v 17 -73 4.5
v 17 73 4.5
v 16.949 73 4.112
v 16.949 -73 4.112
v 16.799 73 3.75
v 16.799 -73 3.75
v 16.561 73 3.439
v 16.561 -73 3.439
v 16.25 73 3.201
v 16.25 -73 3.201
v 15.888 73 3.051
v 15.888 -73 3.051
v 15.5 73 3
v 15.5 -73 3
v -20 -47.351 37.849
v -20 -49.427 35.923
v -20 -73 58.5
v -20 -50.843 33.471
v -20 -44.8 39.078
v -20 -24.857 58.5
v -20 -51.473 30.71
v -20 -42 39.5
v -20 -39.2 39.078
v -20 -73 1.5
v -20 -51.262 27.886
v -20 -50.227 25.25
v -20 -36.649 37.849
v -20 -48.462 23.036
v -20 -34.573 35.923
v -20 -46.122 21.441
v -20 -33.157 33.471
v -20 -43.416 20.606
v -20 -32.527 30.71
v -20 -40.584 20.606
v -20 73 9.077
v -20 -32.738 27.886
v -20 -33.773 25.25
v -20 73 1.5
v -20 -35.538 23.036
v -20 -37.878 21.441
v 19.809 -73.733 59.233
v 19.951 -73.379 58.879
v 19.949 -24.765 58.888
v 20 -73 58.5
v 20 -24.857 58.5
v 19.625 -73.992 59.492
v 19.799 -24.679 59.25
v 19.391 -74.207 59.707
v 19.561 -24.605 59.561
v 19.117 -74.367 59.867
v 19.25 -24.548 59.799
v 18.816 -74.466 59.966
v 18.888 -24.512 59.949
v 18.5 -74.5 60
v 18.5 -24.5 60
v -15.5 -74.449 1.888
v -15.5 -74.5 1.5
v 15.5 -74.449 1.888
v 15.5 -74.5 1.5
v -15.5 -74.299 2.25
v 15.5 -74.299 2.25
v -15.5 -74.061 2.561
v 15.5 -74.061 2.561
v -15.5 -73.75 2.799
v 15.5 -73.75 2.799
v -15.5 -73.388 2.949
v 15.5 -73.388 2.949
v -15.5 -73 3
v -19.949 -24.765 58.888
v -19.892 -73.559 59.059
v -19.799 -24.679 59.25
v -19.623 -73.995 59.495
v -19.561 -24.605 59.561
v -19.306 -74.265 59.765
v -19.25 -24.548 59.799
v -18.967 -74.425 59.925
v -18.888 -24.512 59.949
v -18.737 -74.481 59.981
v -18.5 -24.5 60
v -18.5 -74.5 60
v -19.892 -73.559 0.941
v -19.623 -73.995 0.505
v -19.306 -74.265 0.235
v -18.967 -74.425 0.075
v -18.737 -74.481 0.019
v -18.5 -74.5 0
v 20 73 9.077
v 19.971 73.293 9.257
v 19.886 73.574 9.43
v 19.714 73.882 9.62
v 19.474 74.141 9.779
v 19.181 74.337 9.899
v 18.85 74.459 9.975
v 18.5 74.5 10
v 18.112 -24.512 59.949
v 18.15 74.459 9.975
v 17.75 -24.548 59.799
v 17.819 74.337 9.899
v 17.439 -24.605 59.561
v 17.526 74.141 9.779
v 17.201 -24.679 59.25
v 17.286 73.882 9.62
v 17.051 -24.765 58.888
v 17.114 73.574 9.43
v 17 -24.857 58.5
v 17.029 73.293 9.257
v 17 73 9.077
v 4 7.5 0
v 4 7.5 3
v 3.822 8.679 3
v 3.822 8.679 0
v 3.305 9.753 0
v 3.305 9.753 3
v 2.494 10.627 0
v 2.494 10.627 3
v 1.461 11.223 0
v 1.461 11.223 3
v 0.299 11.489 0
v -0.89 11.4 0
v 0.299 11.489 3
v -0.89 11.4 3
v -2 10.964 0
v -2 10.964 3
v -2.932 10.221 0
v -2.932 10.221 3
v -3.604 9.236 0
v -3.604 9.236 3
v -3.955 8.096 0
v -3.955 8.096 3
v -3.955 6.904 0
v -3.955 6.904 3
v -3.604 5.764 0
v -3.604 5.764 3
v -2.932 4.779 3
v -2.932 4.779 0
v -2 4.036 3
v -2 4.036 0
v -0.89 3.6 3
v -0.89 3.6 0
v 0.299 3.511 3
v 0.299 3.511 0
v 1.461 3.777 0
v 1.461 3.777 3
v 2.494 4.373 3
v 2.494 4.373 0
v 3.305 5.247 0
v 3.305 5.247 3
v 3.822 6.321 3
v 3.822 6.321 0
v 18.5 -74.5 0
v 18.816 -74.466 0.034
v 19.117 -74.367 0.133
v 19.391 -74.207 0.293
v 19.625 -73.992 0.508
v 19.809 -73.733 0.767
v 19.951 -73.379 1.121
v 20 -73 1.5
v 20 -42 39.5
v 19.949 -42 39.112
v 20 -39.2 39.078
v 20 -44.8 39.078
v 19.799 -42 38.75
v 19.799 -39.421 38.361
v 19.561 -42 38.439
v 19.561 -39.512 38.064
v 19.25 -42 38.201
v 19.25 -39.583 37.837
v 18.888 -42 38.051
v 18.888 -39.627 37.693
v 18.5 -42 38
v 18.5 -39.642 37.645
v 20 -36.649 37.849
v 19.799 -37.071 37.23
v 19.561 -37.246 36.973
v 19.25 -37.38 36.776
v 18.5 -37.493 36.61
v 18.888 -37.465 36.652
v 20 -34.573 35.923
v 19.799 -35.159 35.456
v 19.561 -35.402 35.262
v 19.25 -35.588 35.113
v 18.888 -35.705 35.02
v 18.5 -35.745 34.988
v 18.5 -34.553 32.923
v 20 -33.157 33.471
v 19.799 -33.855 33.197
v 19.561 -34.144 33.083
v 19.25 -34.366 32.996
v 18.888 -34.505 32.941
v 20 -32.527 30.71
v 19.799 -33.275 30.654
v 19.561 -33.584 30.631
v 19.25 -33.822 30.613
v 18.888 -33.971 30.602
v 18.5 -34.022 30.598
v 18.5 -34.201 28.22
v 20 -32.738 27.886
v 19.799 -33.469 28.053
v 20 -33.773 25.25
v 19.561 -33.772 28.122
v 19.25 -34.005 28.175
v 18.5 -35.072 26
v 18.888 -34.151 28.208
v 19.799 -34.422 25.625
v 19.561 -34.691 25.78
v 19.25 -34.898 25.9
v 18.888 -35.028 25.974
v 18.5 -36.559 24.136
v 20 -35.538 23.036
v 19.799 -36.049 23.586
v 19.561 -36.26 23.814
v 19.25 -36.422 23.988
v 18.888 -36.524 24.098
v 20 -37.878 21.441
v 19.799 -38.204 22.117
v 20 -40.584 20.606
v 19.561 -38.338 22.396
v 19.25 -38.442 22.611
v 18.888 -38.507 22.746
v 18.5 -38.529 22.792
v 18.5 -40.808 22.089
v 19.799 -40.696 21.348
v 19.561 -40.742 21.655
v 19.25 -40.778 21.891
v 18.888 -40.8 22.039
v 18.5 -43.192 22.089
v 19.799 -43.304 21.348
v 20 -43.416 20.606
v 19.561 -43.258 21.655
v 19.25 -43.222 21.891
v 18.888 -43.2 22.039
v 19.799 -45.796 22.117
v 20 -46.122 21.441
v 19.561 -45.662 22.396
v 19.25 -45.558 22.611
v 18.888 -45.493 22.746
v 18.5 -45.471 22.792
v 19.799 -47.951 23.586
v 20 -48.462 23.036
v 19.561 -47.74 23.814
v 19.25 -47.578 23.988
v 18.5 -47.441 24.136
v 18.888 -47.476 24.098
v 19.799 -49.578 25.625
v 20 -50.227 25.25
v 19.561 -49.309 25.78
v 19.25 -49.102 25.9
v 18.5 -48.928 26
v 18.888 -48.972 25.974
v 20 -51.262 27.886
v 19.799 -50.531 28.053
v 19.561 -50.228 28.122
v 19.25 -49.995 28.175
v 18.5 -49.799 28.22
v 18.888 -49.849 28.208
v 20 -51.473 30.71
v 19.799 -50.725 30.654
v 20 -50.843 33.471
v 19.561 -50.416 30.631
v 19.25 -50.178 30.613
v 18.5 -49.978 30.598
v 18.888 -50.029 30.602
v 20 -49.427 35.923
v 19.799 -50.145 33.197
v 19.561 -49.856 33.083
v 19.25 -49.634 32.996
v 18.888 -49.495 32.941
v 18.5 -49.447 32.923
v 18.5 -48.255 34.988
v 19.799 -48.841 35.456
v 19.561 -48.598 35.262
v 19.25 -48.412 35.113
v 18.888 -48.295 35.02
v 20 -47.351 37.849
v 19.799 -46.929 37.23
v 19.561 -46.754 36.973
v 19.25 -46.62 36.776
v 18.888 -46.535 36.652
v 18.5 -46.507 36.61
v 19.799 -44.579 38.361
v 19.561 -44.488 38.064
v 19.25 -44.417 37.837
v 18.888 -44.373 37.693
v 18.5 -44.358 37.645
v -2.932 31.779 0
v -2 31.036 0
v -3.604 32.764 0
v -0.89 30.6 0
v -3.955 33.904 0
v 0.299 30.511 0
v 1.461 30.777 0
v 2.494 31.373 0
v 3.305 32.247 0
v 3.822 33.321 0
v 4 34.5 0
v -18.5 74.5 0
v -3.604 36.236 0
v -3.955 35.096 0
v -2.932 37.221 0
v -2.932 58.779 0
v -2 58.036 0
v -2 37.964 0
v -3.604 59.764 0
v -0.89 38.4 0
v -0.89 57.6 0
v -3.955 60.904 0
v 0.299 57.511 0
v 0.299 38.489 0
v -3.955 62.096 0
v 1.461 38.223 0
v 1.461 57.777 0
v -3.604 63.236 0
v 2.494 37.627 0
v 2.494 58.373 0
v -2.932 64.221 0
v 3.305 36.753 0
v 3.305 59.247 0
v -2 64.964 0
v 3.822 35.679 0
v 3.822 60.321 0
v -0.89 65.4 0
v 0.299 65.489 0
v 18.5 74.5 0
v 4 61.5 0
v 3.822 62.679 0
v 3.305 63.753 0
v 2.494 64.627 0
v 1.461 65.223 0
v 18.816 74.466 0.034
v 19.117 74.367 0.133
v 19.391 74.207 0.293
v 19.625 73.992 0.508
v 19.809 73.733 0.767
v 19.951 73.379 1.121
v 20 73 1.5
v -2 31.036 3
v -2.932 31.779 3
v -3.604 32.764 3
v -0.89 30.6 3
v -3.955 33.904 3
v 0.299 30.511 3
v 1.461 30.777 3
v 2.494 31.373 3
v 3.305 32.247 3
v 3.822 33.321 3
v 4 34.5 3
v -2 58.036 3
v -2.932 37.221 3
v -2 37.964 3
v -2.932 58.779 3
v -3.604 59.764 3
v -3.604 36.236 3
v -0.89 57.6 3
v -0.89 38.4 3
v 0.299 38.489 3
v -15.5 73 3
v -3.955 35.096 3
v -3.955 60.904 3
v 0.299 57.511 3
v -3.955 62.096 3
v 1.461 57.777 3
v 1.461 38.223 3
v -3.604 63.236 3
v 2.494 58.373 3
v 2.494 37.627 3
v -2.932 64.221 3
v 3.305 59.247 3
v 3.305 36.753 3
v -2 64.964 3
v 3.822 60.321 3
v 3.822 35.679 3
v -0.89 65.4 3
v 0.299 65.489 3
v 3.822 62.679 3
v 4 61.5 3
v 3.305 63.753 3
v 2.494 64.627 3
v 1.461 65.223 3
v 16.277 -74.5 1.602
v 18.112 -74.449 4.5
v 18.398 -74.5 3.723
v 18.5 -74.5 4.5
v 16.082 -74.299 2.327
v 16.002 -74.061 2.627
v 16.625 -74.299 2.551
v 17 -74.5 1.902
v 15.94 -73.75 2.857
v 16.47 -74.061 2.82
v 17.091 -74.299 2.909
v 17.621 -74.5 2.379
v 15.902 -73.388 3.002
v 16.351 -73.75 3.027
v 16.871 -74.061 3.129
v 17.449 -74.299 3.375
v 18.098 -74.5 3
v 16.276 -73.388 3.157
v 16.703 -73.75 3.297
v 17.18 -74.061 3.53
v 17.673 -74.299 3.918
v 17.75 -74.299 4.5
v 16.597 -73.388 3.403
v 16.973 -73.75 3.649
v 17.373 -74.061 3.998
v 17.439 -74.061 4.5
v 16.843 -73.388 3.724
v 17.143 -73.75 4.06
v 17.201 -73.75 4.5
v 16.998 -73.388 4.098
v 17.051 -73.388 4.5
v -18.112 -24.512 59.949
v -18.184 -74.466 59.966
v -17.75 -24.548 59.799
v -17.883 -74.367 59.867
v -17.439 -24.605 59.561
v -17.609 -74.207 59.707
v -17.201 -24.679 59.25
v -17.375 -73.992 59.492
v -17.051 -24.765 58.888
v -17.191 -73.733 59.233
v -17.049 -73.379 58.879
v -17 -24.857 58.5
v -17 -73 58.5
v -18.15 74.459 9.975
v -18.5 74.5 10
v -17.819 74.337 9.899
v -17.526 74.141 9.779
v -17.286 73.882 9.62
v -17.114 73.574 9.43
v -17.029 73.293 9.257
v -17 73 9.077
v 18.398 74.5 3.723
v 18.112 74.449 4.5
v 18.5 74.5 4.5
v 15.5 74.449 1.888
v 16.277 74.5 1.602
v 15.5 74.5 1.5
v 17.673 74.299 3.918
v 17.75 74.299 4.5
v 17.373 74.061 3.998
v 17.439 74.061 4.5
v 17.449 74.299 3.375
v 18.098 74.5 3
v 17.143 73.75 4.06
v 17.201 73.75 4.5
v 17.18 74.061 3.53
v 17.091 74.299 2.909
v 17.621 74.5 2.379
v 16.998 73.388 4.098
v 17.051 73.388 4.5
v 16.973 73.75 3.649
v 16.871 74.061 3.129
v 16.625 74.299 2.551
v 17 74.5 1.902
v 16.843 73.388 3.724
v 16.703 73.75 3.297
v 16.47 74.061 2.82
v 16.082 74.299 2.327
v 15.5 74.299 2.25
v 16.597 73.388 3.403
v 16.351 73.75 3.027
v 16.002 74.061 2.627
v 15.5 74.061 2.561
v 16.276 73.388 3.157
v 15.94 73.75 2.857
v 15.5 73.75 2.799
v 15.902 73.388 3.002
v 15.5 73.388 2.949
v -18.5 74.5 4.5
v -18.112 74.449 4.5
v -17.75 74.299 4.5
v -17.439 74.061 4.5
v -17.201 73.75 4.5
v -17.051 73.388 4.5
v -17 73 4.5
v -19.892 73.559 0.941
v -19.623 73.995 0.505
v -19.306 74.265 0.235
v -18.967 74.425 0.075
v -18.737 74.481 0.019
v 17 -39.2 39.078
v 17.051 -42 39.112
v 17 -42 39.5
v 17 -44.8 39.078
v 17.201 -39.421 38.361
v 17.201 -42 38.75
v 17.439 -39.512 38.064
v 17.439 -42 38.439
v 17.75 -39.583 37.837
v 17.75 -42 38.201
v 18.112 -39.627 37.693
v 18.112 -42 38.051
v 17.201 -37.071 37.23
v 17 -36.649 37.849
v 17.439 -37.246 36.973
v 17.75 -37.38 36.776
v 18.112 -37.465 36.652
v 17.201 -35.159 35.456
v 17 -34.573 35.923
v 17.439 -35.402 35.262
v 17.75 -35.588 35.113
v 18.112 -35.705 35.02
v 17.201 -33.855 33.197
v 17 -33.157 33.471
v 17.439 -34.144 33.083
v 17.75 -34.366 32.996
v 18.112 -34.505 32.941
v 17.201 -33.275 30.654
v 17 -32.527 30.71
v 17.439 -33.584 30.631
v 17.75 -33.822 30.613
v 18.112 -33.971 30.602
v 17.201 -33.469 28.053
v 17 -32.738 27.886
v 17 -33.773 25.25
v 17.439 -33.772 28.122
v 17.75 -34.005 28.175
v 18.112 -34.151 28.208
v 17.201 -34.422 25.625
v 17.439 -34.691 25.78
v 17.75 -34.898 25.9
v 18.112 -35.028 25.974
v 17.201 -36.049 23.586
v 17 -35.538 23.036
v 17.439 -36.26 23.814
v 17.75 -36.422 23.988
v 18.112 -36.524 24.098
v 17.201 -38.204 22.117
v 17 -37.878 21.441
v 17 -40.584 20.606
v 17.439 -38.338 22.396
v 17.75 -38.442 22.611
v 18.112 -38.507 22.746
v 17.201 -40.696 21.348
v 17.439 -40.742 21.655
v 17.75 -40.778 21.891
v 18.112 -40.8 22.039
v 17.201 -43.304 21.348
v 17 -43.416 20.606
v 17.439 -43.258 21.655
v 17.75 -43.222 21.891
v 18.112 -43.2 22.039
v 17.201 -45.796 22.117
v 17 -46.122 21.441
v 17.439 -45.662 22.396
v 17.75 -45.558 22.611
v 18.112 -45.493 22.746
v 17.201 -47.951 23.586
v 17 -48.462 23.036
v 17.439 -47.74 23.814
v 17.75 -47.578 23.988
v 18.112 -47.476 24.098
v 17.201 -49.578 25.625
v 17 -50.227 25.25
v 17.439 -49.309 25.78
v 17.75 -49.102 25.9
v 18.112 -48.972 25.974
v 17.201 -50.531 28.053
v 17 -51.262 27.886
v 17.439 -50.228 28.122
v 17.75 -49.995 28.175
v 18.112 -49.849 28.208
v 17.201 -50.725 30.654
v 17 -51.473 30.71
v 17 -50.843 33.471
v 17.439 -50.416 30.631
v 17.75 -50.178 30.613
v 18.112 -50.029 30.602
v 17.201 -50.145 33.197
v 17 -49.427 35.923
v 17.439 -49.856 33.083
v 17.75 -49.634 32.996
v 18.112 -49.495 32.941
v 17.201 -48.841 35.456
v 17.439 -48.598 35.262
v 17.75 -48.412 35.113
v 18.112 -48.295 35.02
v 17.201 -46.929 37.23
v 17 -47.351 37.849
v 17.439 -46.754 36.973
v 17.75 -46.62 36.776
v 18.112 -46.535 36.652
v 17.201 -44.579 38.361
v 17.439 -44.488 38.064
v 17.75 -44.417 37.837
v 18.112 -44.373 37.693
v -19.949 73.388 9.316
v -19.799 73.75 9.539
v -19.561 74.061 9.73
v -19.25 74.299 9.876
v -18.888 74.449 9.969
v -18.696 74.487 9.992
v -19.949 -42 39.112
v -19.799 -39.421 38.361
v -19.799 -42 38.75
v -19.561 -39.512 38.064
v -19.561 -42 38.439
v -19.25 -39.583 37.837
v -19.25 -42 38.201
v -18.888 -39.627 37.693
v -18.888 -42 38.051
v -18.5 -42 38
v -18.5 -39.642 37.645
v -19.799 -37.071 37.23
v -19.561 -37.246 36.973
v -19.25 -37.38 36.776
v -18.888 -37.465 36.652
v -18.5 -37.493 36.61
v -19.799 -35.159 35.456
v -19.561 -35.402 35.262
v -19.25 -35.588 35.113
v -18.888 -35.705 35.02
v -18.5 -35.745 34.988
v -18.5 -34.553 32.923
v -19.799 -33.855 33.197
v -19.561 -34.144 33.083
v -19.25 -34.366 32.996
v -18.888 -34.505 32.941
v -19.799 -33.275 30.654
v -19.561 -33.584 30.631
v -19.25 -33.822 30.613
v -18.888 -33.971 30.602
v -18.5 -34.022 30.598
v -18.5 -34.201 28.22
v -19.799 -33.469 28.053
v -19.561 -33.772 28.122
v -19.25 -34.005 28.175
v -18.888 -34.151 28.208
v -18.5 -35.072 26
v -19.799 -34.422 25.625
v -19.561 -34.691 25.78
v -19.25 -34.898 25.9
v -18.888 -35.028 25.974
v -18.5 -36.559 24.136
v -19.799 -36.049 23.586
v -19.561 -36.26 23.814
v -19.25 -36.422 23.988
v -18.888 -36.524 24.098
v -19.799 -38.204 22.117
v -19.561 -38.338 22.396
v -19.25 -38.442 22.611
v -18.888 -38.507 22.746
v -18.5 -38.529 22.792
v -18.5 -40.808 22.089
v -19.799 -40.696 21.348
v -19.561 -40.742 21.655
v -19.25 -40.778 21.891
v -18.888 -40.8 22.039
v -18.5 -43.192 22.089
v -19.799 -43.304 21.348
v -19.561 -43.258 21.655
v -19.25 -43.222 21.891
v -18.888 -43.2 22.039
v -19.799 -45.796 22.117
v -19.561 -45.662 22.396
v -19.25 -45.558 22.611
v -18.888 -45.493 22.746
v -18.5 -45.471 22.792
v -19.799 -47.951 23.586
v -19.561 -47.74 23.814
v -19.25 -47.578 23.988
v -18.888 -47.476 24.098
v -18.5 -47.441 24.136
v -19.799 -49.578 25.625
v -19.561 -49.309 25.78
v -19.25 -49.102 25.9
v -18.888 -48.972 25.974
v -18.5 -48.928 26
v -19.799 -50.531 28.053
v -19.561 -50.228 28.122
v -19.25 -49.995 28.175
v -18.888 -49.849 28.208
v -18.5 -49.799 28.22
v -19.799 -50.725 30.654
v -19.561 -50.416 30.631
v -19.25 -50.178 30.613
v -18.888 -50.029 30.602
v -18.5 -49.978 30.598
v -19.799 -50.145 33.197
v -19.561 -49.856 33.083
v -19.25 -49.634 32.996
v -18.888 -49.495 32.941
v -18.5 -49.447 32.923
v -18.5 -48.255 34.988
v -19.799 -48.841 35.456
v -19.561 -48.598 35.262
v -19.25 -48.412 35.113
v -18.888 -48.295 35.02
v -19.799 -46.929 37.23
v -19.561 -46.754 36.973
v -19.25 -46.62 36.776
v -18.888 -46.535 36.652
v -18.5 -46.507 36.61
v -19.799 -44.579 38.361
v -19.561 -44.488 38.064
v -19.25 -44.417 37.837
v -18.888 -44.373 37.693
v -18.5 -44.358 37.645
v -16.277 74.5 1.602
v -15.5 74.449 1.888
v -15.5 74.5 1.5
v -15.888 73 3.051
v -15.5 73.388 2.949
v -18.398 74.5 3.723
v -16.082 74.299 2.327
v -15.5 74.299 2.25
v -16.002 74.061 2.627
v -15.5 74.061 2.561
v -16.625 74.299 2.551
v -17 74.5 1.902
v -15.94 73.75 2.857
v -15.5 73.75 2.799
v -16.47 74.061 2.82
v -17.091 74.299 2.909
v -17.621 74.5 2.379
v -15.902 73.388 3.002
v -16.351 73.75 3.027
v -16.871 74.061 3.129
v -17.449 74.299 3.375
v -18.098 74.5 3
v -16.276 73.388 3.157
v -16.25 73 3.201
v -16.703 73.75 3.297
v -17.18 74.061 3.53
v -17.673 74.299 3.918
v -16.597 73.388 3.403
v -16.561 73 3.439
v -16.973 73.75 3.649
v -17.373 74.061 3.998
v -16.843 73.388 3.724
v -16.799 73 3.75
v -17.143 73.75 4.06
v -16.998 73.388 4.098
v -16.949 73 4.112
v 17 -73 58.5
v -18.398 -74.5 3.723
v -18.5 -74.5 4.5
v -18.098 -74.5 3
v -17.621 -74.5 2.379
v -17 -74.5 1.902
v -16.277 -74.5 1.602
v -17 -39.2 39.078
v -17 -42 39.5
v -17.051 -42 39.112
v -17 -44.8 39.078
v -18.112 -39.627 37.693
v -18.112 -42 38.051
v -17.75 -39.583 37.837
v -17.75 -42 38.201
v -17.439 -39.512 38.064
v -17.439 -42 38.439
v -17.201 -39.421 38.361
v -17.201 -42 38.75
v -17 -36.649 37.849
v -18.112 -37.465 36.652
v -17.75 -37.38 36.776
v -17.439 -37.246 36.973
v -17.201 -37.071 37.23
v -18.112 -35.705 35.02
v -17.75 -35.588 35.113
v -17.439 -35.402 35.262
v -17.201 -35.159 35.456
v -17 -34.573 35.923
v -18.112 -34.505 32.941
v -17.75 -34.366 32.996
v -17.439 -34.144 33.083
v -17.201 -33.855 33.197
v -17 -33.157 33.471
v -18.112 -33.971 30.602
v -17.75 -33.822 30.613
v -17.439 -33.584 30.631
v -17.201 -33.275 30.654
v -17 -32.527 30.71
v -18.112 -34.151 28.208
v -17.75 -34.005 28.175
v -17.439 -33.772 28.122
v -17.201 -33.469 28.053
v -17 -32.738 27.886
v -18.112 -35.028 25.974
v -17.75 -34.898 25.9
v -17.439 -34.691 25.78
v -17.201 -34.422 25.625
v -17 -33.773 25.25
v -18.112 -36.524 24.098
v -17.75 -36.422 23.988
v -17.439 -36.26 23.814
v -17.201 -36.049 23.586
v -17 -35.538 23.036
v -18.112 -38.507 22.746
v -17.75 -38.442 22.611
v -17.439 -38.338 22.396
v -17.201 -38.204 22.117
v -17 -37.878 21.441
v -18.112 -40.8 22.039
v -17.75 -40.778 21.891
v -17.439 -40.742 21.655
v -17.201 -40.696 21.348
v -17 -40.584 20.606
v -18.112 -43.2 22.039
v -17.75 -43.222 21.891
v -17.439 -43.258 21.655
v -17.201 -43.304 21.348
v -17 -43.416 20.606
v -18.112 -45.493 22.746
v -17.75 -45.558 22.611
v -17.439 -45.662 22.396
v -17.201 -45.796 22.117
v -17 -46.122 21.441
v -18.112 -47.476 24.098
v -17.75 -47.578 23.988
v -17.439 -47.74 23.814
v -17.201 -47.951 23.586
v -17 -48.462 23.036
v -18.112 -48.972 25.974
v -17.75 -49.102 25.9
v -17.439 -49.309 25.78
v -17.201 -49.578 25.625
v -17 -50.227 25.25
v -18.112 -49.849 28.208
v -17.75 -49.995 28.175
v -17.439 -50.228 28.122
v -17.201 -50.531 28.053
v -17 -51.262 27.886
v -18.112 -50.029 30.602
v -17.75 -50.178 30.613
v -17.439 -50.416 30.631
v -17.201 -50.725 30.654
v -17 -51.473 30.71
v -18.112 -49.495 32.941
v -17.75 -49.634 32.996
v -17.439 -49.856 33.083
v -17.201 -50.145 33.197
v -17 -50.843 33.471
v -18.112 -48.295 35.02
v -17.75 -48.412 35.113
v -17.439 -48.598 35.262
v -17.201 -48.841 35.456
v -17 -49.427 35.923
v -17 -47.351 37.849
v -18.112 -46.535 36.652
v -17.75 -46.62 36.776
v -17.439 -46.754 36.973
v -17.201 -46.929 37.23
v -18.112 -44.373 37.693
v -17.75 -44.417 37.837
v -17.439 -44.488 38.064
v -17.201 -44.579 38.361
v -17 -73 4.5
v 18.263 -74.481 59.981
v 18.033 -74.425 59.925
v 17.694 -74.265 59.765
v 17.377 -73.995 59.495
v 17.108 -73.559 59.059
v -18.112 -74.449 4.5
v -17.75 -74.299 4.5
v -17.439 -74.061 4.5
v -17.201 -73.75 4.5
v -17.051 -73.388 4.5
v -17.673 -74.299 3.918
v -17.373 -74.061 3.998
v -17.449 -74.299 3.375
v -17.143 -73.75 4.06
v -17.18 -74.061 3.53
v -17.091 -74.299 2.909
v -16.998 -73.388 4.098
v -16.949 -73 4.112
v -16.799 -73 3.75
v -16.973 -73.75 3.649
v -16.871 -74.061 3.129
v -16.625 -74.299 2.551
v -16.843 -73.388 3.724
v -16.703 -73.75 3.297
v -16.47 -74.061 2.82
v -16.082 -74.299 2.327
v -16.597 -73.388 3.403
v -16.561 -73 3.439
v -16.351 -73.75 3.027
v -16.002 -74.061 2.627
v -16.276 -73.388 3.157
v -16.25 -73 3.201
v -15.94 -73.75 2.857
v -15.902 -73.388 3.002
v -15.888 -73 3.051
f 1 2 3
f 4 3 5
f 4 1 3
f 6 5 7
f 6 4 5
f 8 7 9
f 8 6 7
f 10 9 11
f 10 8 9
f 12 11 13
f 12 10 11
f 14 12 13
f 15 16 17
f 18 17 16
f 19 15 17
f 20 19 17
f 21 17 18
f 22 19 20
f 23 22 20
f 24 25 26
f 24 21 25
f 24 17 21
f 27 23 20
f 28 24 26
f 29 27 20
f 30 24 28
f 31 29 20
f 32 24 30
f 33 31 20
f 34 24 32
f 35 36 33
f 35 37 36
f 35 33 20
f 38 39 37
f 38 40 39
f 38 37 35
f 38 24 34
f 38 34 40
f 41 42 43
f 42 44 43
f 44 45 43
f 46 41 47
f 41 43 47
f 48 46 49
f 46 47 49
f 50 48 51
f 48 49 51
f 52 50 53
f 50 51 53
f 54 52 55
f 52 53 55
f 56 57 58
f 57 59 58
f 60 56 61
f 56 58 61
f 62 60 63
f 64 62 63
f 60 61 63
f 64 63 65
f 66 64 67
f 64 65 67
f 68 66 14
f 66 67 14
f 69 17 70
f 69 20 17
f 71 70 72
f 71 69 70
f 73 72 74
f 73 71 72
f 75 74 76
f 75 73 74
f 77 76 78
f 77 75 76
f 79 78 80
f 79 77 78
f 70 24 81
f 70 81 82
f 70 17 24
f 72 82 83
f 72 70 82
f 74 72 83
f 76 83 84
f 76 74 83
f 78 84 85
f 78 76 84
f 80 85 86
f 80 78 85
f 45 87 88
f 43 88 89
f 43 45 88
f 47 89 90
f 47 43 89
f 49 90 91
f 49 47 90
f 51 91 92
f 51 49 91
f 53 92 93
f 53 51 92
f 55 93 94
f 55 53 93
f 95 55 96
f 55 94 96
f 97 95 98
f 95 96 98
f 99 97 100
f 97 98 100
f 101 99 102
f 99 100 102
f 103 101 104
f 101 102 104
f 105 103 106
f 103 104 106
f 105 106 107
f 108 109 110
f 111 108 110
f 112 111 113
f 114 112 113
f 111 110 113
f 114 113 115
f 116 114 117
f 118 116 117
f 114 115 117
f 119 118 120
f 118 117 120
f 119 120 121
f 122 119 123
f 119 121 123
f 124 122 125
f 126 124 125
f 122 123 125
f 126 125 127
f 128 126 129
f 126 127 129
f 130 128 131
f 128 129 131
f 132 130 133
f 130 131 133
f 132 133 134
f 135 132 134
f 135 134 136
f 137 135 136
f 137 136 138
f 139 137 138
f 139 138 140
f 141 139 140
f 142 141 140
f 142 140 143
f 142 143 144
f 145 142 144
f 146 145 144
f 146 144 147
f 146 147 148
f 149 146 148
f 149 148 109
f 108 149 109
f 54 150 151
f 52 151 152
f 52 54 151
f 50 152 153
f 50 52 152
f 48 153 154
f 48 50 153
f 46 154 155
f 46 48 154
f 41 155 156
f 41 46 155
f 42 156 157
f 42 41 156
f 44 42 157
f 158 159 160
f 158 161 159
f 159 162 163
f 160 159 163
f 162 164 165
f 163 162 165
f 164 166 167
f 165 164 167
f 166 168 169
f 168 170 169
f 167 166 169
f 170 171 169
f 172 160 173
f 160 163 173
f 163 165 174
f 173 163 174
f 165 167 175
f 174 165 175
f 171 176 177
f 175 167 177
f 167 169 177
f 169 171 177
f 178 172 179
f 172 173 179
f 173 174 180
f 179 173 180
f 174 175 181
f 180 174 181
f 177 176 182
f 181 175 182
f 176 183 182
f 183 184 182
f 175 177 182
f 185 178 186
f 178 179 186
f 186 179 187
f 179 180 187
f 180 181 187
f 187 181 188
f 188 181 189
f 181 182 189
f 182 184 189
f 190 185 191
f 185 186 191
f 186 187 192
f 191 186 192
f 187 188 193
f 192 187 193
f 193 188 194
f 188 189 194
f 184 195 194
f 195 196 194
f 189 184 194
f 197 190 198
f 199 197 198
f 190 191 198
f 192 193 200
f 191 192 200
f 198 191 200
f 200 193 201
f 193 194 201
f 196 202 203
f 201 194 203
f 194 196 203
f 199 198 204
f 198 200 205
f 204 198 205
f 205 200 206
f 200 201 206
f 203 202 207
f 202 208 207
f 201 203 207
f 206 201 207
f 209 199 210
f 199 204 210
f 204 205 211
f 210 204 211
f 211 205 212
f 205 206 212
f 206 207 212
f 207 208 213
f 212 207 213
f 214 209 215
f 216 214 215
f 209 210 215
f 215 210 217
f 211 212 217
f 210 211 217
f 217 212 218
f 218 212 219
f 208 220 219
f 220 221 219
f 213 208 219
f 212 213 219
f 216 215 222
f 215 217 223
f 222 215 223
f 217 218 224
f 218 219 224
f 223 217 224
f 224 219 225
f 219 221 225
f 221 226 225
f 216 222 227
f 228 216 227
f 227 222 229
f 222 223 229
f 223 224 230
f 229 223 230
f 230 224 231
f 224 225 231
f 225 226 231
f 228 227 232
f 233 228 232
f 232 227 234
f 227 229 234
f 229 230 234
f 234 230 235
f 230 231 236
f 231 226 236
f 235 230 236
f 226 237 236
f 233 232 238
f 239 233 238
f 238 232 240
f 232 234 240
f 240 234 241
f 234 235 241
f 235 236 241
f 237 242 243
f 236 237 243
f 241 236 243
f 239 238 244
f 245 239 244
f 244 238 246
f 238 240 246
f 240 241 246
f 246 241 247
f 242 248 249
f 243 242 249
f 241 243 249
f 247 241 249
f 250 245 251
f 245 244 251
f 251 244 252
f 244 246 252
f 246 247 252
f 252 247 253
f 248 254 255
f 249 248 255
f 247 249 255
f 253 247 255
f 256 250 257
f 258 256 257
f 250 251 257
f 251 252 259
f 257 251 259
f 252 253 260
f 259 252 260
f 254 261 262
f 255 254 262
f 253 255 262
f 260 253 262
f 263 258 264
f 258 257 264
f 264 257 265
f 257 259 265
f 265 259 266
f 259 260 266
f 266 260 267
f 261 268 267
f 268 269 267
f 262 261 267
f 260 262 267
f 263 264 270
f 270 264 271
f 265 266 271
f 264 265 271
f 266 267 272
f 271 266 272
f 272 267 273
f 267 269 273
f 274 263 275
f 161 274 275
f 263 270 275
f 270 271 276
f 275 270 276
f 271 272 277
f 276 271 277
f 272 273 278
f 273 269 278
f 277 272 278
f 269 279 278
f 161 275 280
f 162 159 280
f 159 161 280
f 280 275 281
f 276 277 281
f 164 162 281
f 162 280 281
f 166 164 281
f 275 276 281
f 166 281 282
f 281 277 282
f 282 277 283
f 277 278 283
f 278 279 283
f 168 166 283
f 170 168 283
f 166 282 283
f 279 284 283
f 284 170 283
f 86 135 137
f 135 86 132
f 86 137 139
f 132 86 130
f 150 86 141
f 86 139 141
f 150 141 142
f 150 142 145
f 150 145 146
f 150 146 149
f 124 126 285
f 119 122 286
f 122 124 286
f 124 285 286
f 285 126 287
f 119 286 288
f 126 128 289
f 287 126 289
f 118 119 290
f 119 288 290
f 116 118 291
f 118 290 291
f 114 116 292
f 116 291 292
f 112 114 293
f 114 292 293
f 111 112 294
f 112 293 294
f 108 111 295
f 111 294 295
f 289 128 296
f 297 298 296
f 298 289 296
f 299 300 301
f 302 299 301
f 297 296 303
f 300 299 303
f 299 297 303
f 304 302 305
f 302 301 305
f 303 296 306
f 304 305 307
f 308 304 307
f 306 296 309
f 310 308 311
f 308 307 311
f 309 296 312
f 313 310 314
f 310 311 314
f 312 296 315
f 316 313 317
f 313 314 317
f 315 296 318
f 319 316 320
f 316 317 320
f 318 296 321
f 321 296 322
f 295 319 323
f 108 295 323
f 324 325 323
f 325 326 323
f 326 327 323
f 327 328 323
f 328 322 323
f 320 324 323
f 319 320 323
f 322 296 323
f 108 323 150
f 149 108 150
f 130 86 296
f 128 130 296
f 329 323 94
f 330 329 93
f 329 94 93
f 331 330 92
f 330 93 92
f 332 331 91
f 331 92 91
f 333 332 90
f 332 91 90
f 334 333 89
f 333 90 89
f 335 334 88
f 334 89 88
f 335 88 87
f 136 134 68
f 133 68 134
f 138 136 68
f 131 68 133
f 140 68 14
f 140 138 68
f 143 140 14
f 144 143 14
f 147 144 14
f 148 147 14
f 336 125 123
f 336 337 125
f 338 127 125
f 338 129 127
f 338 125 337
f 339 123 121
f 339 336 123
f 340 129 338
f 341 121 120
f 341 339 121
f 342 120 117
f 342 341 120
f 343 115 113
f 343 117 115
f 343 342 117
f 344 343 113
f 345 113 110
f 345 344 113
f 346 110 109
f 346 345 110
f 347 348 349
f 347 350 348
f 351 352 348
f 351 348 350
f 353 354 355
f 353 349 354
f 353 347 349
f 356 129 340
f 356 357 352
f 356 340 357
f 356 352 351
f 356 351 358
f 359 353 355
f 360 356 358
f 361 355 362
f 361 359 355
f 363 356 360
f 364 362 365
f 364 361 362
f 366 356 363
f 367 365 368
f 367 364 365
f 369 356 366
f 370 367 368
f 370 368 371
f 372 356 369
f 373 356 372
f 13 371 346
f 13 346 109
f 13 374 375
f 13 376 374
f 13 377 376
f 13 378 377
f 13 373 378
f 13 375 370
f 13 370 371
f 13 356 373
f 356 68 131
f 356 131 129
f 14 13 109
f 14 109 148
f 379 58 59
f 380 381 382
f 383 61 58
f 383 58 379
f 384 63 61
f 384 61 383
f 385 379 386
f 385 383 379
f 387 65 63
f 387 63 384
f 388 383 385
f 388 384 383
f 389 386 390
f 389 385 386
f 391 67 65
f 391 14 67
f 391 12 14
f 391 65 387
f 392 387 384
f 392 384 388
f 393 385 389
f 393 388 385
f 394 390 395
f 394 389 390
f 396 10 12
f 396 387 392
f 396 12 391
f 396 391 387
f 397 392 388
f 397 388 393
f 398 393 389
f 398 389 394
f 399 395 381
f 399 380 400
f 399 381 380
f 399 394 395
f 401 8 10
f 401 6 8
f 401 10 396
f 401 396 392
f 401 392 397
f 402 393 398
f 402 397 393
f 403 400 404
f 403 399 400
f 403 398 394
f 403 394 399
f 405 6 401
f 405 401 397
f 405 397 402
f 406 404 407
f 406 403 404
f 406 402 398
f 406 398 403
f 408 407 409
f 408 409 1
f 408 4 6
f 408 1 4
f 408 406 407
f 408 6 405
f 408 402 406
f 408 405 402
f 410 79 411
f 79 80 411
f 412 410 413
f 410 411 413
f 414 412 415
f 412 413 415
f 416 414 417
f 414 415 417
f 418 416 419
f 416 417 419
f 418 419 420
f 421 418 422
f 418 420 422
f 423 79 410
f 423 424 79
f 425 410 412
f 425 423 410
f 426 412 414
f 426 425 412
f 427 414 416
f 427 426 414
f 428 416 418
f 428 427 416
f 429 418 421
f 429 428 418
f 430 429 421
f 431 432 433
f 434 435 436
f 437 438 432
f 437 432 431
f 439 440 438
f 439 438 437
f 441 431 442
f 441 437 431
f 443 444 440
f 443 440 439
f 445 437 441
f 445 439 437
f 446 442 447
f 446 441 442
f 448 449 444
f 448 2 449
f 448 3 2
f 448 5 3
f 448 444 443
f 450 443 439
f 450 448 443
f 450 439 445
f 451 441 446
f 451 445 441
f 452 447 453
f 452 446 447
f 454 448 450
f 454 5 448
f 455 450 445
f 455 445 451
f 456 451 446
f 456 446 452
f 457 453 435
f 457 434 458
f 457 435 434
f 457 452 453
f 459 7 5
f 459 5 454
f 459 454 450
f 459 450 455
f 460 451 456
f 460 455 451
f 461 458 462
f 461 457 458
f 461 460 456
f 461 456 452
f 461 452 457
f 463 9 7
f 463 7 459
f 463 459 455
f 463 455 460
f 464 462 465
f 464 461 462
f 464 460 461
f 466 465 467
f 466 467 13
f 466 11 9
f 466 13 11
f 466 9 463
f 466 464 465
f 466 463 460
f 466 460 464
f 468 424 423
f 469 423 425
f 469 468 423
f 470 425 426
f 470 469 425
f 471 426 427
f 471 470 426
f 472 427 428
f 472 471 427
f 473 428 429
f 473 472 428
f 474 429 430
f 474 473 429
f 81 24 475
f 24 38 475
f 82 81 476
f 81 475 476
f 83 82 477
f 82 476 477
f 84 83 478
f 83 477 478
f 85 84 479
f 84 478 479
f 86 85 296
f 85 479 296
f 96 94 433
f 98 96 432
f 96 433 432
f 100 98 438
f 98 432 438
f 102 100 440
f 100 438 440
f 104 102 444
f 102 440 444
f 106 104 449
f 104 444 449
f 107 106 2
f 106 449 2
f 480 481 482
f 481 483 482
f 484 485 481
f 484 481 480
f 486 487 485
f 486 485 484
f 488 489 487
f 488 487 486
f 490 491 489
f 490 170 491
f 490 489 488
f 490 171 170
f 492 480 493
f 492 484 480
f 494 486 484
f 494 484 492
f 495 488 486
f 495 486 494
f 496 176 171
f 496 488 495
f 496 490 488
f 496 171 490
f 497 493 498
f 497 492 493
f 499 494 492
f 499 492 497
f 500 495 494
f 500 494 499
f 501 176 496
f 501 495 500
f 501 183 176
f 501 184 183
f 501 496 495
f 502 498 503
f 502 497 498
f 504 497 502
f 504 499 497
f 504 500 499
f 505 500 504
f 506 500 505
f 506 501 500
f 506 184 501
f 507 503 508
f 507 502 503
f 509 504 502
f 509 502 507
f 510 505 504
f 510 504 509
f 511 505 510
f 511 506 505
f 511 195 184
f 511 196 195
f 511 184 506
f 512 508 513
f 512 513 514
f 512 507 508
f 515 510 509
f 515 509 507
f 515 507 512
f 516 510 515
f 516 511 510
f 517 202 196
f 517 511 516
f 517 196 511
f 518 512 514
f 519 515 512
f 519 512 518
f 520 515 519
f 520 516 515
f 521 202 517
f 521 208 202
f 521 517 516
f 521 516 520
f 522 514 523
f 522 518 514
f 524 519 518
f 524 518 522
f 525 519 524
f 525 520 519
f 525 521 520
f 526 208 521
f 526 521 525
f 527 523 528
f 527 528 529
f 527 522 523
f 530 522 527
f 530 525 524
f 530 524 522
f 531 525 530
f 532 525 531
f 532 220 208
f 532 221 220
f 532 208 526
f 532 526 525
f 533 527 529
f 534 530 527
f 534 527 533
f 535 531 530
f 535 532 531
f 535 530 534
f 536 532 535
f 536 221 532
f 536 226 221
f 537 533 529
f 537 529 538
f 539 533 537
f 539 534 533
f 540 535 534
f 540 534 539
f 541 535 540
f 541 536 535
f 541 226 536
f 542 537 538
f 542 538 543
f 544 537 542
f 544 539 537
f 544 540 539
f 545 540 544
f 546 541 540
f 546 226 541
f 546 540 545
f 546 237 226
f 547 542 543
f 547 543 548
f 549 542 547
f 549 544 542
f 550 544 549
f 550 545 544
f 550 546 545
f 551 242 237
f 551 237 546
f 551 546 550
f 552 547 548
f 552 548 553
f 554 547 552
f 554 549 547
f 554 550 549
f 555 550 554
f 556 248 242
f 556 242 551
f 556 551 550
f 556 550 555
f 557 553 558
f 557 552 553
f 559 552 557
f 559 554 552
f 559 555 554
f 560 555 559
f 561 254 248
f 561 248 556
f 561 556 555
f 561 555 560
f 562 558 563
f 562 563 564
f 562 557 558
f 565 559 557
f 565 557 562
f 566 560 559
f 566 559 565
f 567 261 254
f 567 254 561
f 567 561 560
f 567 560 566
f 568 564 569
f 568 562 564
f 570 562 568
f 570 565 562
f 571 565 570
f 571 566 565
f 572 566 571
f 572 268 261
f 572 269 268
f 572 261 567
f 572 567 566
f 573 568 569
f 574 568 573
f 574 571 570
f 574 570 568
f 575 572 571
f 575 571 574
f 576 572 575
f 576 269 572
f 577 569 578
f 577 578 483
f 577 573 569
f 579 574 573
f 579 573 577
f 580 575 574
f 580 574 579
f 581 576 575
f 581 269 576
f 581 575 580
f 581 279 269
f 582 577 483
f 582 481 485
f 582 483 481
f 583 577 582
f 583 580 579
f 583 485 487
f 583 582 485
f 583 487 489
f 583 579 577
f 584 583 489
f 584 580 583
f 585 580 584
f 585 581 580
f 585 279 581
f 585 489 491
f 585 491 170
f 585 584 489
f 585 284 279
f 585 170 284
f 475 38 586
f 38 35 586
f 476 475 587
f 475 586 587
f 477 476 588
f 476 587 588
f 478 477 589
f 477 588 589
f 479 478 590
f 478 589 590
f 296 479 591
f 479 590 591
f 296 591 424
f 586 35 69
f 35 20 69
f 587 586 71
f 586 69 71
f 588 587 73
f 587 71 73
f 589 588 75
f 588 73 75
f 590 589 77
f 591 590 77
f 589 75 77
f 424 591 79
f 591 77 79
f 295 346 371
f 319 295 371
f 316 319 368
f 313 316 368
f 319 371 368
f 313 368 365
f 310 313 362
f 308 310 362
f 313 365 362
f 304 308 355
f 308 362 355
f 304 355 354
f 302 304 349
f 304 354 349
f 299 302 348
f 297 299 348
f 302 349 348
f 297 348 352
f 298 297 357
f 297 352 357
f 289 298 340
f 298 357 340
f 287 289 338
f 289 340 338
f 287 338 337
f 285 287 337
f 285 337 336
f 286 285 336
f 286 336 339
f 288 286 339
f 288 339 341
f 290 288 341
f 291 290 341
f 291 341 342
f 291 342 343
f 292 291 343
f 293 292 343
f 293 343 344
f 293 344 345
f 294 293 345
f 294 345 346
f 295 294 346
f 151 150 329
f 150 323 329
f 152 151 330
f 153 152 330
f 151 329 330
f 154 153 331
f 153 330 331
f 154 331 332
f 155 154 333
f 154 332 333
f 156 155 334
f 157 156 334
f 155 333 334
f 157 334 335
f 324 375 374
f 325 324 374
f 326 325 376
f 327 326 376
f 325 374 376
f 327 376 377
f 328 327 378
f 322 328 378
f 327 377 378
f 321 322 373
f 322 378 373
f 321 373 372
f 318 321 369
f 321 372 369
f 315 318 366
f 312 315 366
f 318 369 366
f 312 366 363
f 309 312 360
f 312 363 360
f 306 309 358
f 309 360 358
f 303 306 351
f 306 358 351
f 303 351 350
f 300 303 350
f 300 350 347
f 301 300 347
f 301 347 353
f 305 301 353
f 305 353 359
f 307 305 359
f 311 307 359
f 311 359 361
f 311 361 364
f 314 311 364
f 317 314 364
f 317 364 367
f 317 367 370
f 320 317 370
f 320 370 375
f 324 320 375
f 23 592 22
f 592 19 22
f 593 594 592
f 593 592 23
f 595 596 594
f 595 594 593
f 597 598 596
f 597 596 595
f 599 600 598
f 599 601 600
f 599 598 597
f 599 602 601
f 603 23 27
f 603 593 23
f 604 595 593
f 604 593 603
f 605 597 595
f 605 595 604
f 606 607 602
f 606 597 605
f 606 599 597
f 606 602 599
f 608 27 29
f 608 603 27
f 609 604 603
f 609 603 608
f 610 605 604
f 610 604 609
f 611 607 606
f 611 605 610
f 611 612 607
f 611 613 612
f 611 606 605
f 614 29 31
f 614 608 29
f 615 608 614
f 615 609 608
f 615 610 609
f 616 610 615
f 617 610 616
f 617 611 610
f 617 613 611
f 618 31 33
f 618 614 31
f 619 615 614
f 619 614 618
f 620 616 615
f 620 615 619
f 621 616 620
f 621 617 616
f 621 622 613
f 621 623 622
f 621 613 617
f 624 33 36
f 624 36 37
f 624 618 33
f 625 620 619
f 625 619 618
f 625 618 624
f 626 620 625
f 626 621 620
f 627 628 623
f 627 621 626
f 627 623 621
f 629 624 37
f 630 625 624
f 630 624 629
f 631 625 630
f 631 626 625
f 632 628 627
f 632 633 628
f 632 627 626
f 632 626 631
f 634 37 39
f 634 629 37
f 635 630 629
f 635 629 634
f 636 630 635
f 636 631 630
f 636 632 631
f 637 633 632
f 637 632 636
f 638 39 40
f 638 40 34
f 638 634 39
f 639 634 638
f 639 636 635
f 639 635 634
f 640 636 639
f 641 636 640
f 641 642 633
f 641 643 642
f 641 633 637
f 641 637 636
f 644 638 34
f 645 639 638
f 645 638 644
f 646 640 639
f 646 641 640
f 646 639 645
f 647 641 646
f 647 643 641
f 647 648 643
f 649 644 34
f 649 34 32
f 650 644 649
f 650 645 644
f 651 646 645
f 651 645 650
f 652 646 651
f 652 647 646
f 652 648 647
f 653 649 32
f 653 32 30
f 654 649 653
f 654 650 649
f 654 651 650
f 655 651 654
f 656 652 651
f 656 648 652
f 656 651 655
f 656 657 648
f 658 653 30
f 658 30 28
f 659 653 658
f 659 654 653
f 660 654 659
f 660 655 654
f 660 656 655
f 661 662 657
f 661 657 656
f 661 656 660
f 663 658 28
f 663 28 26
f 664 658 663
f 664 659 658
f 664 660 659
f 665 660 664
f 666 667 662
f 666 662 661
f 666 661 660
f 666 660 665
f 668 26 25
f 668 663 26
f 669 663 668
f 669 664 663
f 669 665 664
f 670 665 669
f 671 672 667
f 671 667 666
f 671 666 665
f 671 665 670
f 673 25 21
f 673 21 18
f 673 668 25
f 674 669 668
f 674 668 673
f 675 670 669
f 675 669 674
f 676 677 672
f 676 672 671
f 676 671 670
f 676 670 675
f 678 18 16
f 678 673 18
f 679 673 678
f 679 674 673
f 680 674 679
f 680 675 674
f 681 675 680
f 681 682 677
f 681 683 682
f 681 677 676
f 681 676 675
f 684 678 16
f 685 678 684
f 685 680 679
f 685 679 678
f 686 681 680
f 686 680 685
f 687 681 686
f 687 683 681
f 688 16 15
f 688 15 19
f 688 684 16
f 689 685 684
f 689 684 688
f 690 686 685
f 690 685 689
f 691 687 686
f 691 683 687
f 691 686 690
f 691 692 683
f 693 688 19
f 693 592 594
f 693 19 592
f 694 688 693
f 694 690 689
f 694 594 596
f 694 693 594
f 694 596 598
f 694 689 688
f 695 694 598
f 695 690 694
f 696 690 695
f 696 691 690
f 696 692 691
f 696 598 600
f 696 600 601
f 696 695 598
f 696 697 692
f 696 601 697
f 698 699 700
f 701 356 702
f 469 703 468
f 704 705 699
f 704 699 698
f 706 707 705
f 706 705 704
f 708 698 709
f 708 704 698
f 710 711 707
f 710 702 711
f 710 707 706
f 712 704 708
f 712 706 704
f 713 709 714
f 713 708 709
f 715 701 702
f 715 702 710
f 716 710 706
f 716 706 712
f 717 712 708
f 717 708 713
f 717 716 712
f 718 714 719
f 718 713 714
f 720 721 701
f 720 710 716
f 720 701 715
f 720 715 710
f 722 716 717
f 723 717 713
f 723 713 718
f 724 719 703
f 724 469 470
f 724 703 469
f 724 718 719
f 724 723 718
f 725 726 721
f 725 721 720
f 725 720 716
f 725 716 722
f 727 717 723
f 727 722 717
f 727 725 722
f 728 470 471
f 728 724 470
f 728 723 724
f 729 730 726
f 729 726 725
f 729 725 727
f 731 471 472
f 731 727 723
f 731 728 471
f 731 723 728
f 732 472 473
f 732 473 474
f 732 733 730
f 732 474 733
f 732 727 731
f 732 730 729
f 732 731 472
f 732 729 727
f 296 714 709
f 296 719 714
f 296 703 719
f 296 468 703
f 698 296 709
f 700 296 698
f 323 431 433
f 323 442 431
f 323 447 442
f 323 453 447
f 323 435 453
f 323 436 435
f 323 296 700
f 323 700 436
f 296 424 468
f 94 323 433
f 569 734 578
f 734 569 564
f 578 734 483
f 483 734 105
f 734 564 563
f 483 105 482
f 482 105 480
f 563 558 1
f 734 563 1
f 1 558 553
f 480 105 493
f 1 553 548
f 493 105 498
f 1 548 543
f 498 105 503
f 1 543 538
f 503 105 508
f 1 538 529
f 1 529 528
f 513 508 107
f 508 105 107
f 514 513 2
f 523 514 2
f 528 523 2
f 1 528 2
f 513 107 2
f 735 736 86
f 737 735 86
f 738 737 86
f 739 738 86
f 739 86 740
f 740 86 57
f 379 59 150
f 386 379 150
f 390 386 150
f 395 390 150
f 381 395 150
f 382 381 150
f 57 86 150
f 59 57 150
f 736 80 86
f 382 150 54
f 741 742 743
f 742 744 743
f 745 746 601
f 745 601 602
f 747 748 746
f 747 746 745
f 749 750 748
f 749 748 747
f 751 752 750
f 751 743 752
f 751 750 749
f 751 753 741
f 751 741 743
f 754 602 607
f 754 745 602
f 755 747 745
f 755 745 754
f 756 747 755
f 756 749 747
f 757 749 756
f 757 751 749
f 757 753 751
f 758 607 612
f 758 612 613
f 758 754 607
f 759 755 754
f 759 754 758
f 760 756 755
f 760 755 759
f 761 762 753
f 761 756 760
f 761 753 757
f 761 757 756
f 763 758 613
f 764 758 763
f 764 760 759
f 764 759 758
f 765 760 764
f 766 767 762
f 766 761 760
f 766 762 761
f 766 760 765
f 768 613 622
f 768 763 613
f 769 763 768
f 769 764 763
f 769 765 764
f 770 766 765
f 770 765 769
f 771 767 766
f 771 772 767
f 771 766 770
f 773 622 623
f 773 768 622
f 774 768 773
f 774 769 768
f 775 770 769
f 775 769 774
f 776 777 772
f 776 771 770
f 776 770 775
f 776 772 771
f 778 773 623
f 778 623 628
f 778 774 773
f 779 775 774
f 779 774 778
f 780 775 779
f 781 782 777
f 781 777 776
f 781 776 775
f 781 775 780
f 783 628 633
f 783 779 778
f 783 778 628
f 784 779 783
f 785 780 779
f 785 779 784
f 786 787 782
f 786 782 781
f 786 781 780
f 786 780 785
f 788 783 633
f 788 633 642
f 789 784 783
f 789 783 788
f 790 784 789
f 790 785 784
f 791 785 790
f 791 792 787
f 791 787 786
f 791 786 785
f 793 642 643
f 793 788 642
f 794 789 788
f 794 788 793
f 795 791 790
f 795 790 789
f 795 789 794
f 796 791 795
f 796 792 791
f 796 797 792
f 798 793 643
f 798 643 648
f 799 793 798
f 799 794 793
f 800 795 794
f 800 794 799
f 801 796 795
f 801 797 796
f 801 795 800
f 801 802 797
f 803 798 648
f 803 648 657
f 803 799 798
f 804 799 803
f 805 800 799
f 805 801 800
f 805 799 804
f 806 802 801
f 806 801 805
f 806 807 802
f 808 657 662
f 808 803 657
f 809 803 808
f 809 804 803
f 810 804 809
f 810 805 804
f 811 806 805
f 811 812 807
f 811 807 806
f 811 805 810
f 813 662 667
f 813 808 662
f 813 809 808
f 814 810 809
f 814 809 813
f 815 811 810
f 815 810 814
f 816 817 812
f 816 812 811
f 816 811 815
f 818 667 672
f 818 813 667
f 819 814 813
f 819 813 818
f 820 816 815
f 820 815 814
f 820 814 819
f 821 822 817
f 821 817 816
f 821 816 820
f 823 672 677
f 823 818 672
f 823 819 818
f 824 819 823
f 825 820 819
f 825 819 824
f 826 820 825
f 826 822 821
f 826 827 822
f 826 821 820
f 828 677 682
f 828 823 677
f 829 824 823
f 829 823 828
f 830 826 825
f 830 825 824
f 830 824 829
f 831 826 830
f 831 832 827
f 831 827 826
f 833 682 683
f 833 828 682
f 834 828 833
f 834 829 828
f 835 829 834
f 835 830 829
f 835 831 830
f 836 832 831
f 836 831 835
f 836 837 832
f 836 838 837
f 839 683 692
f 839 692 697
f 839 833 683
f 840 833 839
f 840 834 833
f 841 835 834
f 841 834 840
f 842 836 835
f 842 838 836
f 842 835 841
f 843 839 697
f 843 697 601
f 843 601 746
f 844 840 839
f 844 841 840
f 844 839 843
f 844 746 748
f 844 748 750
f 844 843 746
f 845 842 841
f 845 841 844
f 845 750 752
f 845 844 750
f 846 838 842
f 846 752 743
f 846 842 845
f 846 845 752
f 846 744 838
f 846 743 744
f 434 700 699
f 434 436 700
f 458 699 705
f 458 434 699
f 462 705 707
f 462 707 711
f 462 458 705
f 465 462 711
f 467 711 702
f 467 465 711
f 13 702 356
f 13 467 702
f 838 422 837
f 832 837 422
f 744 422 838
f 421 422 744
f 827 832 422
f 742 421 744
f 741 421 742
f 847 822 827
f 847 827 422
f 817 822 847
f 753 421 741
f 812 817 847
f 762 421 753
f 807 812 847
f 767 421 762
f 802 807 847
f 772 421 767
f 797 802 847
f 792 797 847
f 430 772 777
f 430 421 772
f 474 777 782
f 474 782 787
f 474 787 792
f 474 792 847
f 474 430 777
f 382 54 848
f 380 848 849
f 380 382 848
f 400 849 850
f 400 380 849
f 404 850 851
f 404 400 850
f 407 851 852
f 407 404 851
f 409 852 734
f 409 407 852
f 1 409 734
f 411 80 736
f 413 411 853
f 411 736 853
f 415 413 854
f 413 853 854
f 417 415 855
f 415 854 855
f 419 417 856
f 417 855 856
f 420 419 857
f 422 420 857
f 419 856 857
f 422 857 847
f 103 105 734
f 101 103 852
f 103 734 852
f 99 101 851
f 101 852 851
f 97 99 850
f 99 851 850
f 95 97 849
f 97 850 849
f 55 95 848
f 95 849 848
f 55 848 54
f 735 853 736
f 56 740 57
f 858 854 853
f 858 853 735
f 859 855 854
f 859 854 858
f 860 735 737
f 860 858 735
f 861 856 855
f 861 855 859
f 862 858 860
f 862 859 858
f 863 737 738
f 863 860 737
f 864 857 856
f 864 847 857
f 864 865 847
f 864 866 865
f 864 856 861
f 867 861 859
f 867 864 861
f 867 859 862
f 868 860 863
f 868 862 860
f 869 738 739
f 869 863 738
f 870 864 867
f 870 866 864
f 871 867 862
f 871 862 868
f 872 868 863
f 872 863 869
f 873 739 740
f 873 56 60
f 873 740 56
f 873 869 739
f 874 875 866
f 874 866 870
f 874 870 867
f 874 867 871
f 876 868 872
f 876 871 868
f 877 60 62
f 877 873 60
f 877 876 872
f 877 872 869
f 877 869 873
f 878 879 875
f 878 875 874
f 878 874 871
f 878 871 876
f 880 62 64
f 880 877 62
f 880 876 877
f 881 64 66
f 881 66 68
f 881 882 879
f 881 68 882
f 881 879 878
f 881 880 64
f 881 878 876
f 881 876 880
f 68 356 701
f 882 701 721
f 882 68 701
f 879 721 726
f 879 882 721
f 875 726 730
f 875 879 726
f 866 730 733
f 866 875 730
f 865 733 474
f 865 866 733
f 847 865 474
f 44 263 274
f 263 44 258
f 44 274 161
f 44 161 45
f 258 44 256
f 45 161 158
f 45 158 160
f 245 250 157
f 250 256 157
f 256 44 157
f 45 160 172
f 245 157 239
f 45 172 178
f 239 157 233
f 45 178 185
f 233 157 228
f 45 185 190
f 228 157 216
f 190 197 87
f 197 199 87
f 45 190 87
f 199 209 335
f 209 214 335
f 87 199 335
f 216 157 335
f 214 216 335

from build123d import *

# Parameters (mm, degrees)
SZKIC1_W                    = 40
SZKIC1_H                    = 149
DODANIE_WYCI_GNI_CIE1_DEPTH = 60
SZKIC2_W                    = 34
SZKIC2_H                    = 57
WYTNIJ_WYCI_GNI_CIE1_DEPTH  = 162.867229543
SZKIC4_R                    = 8
WYTNIJ_WYCI_GNI_CIE2_DEPTH  = 45
SZKIC5_R                    = 4
WYTNIJ_WYCI_GNI_CIE3_DEPTH  = 96.912720741
ZAOKR_GLENIE1_R             = 1.5


with BuildPart() as part:
    # Szkic1 → Dodanie-wyciągnięcie1 (new body)
    with BuildSketch(Plane.XY):
        Rectangle(SZKIC1_W, SZKIC1_H)
    extrude(amount=DODANIE_WYCI_GNI_CIE1_DEPTH)

    # Szkic2 → Wytnij-wyciągnięcie1 (cut, through all)
    with BuildSketch(Plane(origin=(0, 74.5, 0), x_dir=(1, 0, 0), z_dir=(0, 1, 0))):
        with Locations((0, -31.5)):
            Rectangle(SZKIC2_W, SZKIC2_H)
    extrude(amount=-WYTNIJ_WYCI_GNI_CIE1_DEPTH, mode=Mode.SUBTRACT)

    # Szkic4 → Wytnij-wyciągnięcie2 (cut)
    with BuildSketch(Plane.ZY.offset(20)):
        Polygon((10, 74.5), (60, -24.5), (60, 74.5), align=None)
        with Locations((30, -42)):
            Circle(SZKIC4_R)
    extrude(amount=-WYTNIJ_WYCI_GNI_CIE2_DEPTH, mode=Mode.SUBTRACT)

    # Szkic5 → Wytnij-wyciągnięcie3 (cut, through all)
    with BuildSketch(Plane.XY.offset(3)):
        with Locations((0, 61.5)):
            Circle(SZKIC5_R)
        with Locations((0, 34.5)):
            Circle(SZKIC5_R)
        with Locations((0, 7.5)):
            Circle(SZKIC5_R)
    extrude(amount=-WYTNIJ_WYCI_GNI_CIE3_DEPTH, mode=Mode.SUBTRACT)

    # Zaokrąglenie1
    zaokr_glenie1_edges = [part.edges().sort_by_distance(p)[0] for p in [
        (0, 74.5, 3),
        (0, -74.5, 3),
        (20, 74.5, 5),
        (20, 0, 0),
        (20, -74.5, 30),
        (20, -49.5, 60),
        (20, 25, 35),
        (20, -42, 22),
        (17, -49.5, 60),
        (17, -74.5, 31.5),
        (17, 0, 3),
        (17, 74.5, 6.5),
        (17, 25, 35),
        (17, -42, 22),
        (-17, 74.5, 6.5),
        (-17, 0, 3),
        (-17, -74.5, 31.5),
        (-17, -49.5, 60),
        (-17, 25, 35),
        (-17, -42, 22),
        (-20, -49.5, 60),
        (-20, -74.5, 30),
        (-20, 0, 0),
        (-20, 74.5, 5),
        (-20, 25, 35),
        (-20, -42, 22),
    ]]
    fillet(zaokr_glenie1_edges, radius=ZAOKR_GLENIE1_R - 0.0001)  # a hair under: the kernel refuses the full size


solid = part.part
